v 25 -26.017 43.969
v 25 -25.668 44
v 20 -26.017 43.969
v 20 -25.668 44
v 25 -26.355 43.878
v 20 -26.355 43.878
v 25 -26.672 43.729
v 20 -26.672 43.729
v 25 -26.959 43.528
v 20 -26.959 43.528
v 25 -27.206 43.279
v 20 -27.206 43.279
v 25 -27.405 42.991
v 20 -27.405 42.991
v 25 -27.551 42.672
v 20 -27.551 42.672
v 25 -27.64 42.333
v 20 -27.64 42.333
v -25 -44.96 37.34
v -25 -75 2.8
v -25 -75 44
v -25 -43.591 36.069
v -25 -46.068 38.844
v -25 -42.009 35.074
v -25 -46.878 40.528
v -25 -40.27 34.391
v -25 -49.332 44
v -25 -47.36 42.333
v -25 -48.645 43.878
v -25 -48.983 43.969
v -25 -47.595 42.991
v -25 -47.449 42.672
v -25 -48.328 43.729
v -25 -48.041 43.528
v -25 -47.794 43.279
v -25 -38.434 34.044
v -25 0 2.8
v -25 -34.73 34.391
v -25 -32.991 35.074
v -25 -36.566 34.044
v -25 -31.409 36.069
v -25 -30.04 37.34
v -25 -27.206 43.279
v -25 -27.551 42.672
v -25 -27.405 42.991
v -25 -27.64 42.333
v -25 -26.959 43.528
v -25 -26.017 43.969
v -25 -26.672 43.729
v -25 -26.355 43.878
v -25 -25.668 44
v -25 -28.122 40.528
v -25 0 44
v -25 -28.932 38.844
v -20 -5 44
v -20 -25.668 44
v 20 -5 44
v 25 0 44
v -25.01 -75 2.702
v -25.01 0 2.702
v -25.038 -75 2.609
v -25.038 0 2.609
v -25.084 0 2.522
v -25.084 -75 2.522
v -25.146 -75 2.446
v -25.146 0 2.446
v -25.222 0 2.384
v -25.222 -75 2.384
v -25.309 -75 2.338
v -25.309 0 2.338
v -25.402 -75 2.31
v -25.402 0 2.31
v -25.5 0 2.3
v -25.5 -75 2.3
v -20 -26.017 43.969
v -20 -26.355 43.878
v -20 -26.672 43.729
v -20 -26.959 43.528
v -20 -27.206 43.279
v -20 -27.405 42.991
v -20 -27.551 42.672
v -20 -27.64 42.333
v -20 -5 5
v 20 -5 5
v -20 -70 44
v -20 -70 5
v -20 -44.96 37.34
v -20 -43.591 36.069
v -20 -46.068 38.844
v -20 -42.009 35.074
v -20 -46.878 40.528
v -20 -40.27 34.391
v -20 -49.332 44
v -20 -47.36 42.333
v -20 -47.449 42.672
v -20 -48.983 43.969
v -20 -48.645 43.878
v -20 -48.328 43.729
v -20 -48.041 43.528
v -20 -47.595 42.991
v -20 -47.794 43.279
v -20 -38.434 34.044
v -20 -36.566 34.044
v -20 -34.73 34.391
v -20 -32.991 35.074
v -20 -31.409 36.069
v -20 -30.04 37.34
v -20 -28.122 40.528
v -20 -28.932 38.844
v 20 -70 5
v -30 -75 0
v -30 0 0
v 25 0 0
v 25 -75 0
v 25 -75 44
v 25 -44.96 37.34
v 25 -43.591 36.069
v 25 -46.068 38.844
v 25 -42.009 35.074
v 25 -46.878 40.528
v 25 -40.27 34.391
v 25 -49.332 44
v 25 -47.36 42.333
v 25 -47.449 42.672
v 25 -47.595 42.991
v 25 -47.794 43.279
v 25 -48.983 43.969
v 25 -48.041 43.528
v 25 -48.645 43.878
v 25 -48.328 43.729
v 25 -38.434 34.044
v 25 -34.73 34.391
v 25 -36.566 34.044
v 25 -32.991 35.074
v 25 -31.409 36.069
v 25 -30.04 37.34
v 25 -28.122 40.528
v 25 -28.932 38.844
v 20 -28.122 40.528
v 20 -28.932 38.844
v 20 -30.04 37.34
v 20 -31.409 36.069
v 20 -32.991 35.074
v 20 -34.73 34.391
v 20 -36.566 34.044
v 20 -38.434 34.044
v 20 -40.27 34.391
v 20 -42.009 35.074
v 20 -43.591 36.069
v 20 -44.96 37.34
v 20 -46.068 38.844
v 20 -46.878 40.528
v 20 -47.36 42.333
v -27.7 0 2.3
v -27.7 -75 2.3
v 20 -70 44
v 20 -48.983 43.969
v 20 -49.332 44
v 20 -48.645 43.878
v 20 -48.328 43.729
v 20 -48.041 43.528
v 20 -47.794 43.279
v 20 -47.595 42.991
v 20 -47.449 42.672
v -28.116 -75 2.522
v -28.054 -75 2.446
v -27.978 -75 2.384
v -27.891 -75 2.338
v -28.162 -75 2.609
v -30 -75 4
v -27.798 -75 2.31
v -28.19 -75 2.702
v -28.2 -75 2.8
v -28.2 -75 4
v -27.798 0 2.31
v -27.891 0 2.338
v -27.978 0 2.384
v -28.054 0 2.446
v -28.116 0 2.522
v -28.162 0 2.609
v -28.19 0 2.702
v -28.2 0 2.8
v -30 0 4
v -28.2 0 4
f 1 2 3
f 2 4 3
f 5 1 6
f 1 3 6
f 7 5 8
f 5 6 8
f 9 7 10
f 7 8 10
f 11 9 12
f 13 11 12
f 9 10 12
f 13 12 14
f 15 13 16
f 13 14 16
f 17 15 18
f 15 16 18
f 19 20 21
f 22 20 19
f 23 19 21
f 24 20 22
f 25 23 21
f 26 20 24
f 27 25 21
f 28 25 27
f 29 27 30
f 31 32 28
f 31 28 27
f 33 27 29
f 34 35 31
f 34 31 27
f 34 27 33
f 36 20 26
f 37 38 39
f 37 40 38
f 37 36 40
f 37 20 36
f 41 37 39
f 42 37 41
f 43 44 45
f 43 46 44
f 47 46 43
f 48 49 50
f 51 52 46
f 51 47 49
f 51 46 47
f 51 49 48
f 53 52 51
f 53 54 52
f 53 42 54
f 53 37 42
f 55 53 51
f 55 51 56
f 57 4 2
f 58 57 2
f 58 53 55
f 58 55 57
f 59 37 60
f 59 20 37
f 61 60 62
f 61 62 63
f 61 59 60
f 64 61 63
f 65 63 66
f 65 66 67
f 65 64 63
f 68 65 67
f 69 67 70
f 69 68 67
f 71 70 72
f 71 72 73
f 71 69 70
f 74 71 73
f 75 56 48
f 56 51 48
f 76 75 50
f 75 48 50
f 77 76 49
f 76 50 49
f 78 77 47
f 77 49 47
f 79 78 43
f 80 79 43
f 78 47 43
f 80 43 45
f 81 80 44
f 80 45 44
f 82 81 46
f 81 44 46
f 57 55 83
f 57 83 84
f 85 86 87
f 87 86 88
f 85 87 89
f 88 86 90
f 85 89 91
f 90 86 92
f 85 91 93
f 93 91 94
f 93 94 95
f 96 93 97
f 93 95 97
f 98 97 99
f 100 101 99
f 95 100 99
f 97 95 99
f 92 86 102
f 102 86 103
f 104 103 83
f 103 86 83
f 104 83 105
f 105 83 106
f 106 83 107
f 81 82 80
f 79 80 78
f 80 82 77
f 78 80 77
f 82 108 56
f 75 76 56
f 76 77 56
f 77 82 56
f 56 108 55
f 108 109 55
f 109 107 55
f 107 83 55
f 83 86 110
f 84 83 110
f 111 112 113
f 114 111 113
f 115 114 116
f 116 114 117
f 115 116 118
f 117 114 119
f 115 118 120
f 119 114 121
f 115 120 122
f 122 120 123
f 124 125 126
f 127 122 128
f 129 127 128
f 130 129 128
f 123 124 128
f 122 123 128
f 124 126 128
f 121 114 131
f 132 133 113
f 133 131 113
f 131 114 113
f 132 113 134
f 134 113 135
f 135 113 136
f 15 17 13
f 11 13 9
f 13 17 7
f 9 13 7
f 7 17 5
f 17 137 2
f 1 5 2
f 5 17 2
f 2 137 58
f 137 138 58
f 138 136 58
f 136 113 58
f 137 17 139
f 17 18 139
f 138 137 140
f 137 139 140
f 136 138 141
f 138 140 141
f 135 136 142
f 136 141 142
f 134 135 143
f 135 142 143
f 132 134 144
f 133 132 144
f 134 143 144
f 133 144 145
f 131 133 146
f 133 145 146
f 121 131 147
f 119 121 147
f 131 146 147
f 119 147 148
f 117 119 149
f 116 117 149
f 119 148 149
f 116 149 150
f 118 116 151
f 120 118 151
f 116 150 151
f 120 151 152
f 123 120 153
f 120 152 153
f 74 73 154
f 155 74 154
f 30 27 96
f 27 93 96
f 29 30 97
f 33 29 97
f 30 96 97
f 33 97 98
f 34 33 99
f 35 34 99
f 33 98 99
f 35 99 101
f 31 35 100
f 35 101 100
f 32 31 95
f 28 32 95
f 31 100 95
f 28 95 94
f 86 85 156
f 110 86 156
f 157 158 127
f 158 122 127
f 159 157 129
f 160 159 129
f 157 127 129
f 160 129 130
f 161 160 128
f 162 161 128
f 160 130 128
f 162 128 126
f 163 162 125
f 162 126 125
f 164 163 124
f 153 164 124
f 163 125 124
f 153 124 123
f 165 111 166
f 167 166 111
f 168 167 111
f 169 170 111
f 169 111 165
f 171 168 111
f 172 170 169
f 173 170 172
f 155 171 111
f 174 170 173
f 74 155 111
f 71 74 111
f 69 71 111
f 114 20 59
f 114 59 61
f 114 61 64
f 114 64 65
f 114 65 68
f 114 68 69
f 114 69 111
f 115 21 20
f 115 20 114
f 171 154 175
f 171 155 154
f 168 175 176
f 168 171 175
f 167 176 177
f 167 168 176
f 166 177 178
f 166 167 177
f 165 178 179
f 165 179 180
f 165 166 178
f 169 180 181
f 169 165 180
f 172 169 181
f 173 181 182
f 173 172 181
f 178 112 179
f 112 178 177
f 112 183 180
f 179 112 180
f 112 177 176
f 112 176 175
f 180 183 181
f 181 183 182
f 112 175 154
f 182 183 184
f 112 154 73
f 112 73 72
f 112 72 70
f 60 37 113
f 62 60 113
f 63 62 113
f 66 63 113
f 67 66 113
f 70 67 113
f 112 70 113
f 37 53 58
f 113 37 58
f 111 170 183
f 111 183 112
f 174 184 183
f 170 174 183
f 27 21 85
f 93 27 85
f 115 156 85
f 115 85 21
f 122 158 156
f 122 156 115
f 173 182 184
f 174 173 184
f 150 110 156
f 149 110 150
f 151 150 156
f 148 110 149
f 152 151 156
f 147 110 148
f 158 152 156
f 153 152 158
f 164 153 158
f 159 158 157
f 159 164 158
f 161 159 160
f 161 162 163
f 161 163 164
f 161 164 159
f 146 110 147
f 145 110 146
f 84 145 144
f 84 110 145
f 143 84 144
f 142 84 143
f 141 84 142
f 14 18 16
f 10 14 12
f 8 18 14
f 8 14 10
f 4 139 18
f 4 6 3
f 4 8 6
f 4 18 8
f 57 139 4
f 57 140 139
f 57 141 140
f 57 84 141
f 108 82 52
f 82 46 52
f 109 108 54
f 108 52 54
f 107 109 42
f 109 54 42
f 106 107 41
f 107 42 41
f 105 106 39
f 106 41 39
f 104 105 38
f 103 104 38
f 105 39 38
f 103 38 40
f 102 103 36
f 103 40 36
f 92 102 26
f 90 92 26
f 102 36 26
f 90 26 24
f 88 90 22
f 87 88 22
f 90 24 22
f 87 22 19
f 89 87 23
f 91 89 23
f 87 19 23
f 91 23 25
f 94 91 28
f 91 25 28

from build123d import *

# Parameters (mm, degrees)
F1_DEPTH = 75
F2_R     = 0.5
F3_W     = 50
F3_H     = 40
F4_DEPTH = 75
F5_T     = -5
F6_R     = 10
F7_DEPTH = 50
F8_R     = 2


with BuildPart() as f1:
    # F0 (on Front) → F1 (new body)
    with BuildSketch(Plane.XZ):
        Polygon((25, 4), (-25, 4), (-25, 2.3), (-25, 0), (25, 0), align=None)
        Polygon((-25, 0), (-25, 2.3), (-28.2, 2.3), (-28.2, 4), (-30, 4), (-30, 0), align=None)
    extrude(amount=F1_DEPTH)

    # F2
    f2_edges = [f1.edges().sort_by_distance(p)[0] for p in [
        (-25, -37.5, 2.3),
        (-28.2, -37.5, 2.3),
    ]]
    fillet(f2_edges, radius=F2_R)

    # F3 (on Front) → F4 (join)
    with BuildSketch(Plane.XZ):
        with Locations((0, 24)):
            Rectangle(F3_W, F3_H)
    extrude(amount=F4_DEPTH)

    # F5
    f5_openings = [f1.faces().sort_by_distance(p)[0] for p in [
        (0, -37.5, 44),
    ]]
    offset(amount=F5_T, openings=f5_openings)

    # F6 (on face) → F7 (cut, through all)
    with BuildSketch(Plane(origin=(-25, 0, 0), x_dir=(0, -1, 0), z_dir=(-1, 0, 0))):
        with Locations((37.5, 44)):
            Circle(F6_R)
    extrude(amount=-F7_DEPTH, mode=Mode.SUBTRACT)

    # F8
    f8_edges = [f1.edges().sort_by_distance(p)[0] for p in [
        (22.5, -47.5, 44),
        (-22.5, -47.5, 44),
        (-22.5, -27.5, 44),
        (22.5, -27.5, 44),
    ]]
    fillet(f8_edges, radius=F8_R)


solid = f1.part
